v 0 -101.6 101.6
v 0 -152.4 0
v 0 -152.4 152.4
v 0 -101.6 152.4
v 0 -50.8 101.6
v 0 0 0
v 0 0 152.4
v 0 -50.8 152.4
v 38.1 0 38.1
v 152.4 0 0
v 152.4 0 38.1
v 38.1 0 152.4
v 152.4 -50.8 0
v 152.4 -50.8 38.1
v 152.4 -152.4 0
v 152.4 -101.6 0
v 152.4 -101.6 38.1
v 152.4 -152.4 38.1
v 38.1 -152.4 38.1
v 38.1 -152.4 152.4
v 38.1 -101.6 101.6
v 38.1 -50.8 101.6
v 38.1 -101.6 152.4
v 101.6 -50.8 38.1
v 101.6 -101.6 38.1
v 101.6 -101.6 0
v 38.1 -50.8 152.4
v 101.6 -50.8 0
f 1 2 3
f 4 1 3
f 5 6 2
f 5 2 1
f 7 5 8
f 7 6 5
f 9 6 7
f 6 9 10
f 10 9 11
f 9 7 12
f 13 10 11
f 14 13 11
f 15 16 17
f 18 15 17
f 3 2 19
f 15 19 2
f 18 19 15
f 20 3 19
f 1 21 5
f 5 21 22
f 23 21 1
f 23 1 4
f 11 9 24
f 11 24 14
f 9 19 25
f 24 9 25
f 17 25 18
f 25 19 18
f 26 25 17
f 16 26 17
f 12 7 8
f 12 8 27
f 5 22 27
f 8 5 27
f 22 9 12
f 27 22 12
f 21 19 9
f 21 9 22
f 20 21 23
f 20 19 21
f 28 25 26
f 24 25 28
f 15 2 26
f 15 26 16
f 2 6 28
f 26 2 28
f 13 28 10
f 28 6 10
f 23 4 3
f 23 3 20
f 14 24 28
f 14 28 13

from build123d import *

# Parameters (mm, degrees)
F0_W     = 152.4
F0_H     = 152.4
F1_DEPTH = 152.4
F2_W     = 114.3
F2_H     = 114.3
F3_DEPTH = 152.4
F4_W     = 101.6
F4_H     = 50.8
F5_DEPTH = 127
F6_W     = 50.8
F6_H     = 101.6
F7_DEPTH = 127


with BuildPart() as f1:
    # F0 (on Front) → F1 (new body)
    with BuildSketch(Plane.XZ):
        with Locations((76.2, 76.2)):
            Rectangle(F0_W, F0_H)
    extrude(amount=F1_DEPTH)

    # F2 (on face) → F3 (cut)
    with BuildSketch(Plane.XZ.offset(152.4)):
        with Locations((95.25, 95.25)):
            Rectangle(F2_W, F2_H)
    extrude(amount=-F3_DEPTH, mode=Mode.SUBTRACT)

    # F4 (on face) → F5 (cut)
    with BuildSketch(Plane.XY.offset(38.1)):
        with Locations((152.4, -76.2)):
            Rectangle(F4_W, F4_H)
    extrude(amount=-F5_DEPTH, mode=Mode.SUBTRACT)

    # F6 (on face) → F7 (cut)
    with BuildSketch(Plane.YZ.offset(38.1)):
        with Locations((-76.2, 152.4)):
            Rectangle(F6_W, F6_H)
    extrude(amount=-F7_DEPTH, mode=Mode.SUBTRACT)


solid = f1.part
